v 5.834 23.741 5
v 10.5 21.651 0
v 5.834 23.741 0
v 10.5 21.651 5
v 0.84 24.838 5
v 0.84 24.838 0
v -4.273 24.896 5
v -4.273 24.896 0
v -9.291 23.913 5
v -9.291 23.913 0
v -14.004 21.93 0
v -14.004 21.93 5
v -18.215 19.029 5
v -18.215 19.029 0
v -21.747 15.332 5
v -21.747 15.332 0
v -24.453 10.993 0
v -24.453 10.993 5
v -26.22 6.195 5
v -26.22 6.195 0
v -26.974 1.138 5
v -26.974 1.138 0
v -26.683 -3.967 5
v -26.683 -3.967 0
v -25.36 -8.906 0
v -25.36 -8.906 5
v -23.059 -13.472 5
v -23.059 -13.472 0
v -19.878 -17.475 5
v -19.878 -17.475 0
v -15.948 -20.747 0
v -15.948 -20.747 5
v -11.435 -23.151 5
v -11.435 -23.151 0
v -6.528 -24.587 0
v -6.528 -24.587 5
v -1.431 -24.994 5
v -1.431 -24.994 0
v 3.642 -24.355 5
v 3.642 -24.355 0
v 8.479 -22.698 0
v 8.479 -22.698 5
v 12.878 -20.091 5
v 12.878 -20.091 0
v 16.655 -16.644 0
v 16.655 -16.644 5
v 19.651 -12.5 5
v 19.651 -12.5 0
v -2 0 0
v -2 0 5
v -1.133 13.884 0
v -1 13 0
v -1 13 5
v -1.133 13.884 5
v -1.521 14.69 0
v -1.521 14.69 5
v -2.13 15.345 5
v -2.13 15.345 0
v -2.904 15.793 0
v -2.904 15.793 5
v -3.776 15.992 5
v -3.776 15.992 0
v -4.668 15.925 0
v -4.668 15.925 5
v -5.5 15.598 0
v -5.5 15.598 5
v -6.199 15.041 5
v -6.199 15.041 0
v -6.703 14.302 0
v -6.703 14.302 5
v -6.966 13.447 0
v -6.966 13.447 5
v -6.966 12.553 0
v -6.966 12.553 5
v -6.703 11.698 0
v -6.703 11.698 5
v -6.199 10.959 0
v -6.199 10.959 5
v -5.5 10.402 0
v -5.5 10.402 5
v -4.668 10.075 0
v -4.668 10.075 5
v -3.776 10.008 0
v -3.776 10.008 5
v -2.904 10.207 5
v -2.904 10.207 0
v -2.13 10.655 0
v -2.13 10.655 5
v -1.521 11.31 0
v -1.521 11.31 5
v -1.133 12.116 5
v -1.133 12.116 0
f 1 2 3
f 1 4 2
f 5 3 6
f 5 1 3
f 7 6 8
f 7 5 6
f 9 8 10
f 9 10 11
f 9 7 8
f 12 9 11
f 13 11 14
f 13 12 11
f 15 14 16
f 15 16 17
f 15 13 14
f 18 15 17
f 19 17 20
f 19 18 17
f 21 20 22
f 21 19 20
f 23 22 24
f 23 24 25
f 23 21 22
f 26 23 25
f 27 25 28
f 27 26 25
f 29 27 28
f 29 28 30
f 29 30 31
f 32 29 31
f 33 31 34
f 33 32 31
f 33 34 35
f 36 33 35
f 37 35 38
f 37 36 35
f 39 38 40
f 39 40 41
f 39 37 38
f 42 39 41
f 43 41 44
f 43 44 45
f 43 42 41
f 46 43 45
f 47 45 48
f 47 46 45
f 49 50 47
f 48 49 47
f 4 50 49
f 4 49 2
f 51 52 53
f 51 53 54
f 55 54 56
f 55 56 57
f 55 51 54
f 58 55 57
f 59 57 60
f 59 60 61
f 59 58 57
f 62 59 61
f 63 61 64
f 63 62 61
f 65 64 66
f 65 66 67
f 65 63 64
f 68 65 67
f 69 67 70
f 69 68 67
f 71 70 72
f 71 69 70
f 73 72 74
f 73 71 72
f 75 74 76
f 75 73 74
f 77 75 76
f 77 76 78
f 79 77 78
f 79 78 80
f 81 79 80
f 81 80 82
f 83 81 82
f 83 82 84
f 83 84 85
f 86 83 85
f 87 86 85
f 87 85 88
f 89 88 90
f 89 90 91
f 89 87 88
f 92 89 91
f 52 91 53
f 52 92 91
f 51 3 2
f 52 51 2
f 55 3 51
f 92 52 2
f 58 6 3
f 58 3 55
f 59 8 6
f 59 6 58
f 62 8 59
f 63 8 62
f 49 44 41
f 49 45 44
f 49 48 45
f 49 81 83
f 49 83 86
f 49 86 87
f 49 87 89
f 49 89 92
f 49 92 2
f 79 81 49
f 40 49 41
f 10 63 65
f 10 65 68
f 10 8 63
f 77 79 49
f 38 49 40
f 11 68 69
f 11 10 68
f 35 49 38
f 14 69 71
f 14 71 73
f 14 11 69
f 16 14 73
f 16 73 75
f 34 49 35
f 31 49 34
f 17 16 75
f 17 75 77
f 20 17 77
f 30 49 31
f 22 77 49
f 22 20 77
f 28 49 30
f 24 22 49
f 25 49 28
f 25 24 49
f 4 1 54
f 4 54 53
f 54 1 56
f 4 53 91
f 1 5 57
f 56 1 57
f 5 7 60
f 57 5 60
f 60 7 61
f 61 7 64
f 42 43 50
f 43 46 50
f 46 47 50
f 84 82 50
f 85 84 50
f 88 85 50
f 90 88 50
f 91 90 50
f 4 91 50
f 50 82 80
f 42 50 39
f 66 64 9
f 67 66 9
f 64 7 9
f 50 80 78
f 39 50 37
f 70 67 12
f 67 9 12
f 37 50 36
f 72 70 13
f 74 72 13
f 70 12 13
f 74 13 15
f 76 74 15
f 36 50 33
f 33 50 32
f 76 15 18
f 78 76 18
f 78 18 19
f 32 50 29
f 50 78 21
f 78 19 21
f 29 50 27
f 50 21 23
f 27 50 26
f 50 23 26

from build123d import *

# Parameters (mm, degrees)
CYLINDER001_R            = 3
CYLINDER001_DEPTH        = 5
CYLINDER_W               = 25
CYLINDER_H               = 5
CYLINDER_ANGLE           = 270
CYLINDER_PLACEMENT_ANGLE = 60


with BuildPart() as cilindro001:
    # Cylinder001 → Cylinder001 (new body)
    with BuildSketch(Plane(origin=(-4, 13, 0), x_dir=(1, 0, 0), z_dir=(0, 0, 1))):
        Circle(CYLINDER001_R)
    extrude(amount=CYLINDER001_DEPTH)


with BuildPart() as pacman:
    # Cylinder → Cylinder (revolve)
    with BuildSketch(Plane.XZ):
        with Locations((12.5, 2.5)):
            Rectangle(CYLINDER_W, CYLINDER_H)
    revolve(axis=Axis((0, 0, 0), (0, 0, 1)), revolution_arc=CYLINDER_ANGLE)


with BuildPart() as pacman_1:
    # Cylinder placement: moved
    add(pacman.part.moved(Location((-2, 0, 0))).rotate(Axis((-2, 0, 0), (0, 0, 1)), CYLINDER_PLACEMENT_ANGLE))

    # Cut: cut Cilindro001
    add(cilindro001.part, mode=Mode.SUBTRACT)


solid = pacman_1.part
